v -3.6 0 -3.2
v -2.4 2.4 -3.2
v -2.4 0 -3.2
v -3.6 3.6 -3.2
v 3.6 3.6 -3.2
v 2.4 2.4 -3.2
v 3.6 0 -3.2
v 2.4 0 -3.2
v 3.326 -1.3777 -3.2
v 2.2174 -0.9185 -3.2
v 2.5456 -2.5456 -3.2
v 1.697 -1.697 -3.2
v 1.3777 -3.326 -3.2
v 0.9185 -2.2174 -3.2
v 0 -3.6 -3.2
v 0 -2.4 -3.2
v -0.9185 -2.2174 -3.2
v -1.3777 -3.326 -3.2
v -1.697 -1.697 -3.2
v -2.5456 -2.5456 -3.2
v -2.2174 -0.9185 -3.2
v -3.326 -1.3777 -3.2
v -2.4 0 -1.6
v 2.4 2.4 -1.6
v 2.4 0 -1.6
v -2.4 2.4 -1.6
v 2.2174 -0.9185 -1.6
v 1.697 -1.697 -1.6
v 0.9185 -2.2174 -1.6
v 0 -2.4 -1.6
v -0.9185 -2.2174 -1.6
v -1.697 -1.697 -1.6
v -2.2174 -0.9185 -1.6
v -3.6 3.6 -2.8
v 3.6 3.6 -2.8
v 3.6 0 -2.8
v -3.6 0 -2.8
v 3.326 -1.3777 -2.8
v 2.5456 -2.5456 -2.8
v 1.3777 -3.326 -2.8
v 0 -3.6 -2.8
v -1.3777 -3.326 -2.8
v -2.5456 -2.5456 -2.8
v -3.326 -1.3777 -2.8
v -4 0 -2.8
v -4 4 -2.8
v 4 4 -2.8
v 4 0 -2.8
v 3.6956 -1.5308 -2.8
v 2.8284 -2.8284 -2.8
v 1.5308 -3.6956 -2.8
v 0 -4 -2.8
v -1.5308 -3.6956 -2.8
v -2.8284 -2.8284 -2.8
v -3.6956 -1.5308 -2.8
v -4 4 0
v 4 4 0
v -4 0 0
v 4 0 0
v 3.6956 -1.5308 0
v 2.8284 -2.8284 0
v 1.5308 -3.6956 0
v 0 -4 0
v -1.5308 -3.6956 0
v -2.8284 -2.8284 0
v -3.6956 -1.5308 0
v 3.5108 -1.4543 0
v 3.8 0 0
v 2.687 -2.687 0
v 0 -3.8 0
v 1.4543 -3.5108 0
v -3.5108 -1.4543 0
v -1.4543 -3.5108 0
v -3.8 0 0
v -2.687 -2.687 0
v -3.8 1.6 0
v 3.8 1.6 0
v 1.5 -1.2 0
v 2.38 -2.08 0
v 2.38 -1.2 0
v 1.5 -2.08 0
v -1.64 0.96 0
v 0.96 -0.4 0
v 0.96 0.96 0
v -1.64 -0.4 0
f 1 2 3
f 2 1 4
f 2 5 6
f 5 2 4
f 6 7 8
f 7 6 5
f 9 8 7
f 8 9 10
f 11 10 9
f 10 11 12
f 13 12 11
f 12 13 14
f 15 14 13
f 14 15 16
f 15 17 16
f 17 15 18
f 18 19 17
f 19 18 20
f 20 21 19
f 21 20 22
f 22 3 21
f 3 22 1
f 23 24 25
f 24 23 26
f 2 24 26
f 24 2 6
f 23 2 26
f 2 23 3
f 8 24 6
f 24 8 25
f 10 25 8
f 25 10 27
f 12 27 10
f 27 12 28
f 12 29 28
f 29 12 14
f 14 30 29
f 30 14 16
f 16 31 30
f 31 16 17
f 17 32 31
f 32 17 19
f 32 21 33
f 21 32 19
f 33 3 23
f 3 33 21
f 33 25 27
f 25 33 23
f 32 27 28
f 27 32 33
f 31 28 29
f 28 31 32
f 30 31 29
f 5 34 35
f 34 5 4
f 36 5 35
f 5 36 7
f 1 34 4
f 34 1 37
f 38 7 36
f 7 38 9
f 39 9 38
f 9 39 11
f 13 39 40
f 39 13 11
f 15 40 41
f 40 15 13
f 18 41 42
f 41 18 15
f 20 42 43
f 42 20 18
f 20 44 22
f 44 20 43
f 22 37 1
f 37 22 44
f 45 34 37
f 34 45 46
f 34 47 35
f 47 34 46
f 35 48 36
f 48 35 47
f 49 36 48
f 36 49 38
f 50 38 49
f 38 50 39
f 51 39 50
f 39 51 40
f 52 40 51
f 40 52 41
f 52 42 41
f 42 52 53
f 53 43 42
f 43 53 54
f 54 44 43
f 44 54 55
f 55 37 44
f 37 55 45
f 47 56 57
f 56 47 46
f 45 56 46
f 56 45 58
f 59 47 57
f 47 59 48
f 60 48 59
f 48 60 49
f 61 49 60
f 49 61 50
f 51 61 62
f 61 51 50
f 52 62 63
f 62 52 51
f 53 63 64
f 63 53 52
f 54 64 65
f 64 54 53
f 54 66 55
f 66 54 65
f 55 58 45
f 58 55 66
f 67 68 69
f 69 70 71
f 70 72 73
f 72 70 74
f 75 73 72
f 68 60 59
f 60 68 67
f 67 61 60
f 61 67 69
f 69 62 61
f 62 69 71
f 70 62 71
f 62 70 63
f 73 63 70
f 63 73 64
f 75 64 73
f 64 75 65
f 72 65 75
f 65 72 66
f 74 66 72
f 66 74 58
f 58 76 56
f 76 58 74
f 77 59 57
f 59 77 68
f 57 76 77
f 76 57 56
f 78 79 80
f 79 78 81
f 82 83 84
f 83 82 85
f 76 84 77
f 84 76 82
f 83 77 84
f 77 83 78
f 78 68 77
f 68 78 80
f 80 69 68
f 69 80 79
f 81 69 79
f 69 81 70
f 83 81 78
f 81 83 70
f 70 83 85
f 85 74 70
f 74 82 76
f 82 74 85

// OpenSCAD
// file: ../p/2-4edge.scad
use <../lib.scad>
function ldraw_lib__2_4edge() = [
// 0 Circle 0.5
// 0 Name: 2-4edge.dat
// 0 Author: James Jessiman
// 0 !LDRAW_ORG Primitive UPDATE 2017-01
// 0 !LICENSE Licensed under CC BY 4.0 : see CAreadme.txt
// 
// 0 BFC CERTIFY CCW
  [0,"BFC","CERTIFY"],
  [0,"BFC","CCW"],
// 
// 0 !HISTORY 2007-06-24 [PTadmin] Header formatted for Contributor Agreement
// 0 !HISTORY 2008-07-01 [PTadmin] Official Update 2008-01
// 0 !HISTORY 2017-01-15 [Steffen] BFCed
// 0 !HISTORY 2017-12-30 [PTadmin] Official Update 2017-01
// 
// 
// 2 24 1 0 0 0.9239 0 0.3827
  [2,24,1,0,0,0.9239,0,0.3827],
// 2 24 0.9239 0 0.3827 0.7071 0 0.7071
  [2,24,0.9239,0,0.3827,0.7071,0,0.7071],
// 2 24 0.7071 0 0.7071 0.3827 0 0.9239
  [2,24,0.7071,0,0.7071,0.3827,0,0.9239],
// 2 24 0.3827 0 0.9239 0 0 1
  [2,24,0.3827,0,0.9239,0,0,1],
// 2 24 0 0 1 -0.3827 0 0.9239
  [2,24,0,0,1,-0.3827,0,0.9239],
// 2 24 -0.3827 0 0.9239 -0.7071 0 0.7071
  [2,24,-0.3827,0,0.9239,-0.7071,0,0.7071],
// 2 24 -0.7071 0 0.7071 -0.9239 0 0.3827
  [2,24,-0.7071,0,0.7071,-0.9239,0,0.3827],
// 2 24 -0.9239 0 0.3827 -1 0 0
  [2,24,-0.9239,0,0.3827,-1,0,0],
];
module ldraw_lib__2_4edge(step=0, col=false, unit=2/5, alt=false, line=0.2, solid=!$preview)
    makepoly(ldraw_lib__2_4edge(), step=step, col=col, unit=unit, alt=alt, line=line, solid=solid);
ldraw_lib__2_4edge(line=0.2);
// file: ../p/2-4cyli.scad
use <../lib.scad>
function ldraw_lib__2_4cyli() = [
// 0 Cylinder 0.5
// 0 Name: 2-4cyli.dat
// 0 Author: James Jessiman
// 0 !LDRAW_ORG Primitive UPDATE 2005-01
// 0 !LICENSE Licensed under CC BY 4.0 : see CAreadme.txt
// 
// 0 BFC CERTIFY CCW
  [0,"BFC","CERTIFY"],
  [0,"BFC","CCW"],
// 
// 0 !HISTORY 2002-03-23 [sbliss] Added BFC statement; compacted code
// 0 !HISTORY 2002-04-25 [PTadmin] Official Update 2002-02
// 0 !HISTORY 2004-12-11 [nielsk] Recreated using Primitive Generator, Edge lines fixed, BFC changed to CCW
// 0 !HISTORY 2005-12-28 [PTadmin] Official Update 2005-01
// 0 !HISTORY 2007-06-24 [PTadmin] Header formatted for Contributor Agreement
// 0 !HISTORY 2008-07-01 [PTadmin] Official Update 2008-01
// 
// 
// 4 16 .9239 1 .3827 .9239 0 .3827 1 0 0 1 1 0
  [4,16,.9239,1,.3827,.9239,0,.3827,1,0,0,1,1,0],
// 4 16 .7071 1 .7071 .7071 0 .7071 .9239 0 .3827 .9239 1 .3827
  [4,16,.7071,1,.7071,.7071,0,.7071,.9239,0,.3827,.9239,1,.3827],
// 4 16 .3827 1 .9239 .3827 0 .9239 .7071 0 .7071 .7071 1 .7071
  [4,16,.3827,1,.9239,.3827,0,.9239,.7071,0,.7071,.7071,1,.7071],
// 4 16 0 1 1 0 0 1 .3827 0 .9239 .3827 1 .9239
  [4,16,0,1,1,0,0,1,.3827,0,.9239,.3827,1,.9239],
// 4 16 -.3827 1 .9239 -.3827 0 .9239 0 0 1 0 1 1
  [4,16,-.3827,1,.9239,-.3827,0,.9239,0,0,1,0,1,1],
// 4 16 -.7071 1 .7071 -.7071 0 .7071 -.3827 0 .9239 -.3827 1 .9239
  [4,16,-.7071,1,.7071,-.7071,0,.7071,-.3827,0,.9239,-.3827,1,.9239],
// 4 16 -.9239 1 .3827 -.9239 0 .3827 -.7071 0 .7071 -.7071 1 .7071
  [4,16,-.9239,1,.3827,-.9239,0,.3827,-.7071,0,.7071,-.7071,1,.7071],
// 4 16 -1 1 0 -1 0 0 -.9239 0 .3827 -.9239 1 .3827
  [4,16,-1,1,0,-1,0,0,-.9239,0,.3827,-.9239,1,.3827],
// 5 24 1 1 0 1 0 0 1 1 -.4142 .9239 1 .3827
  [5,24,1,1,0,1,0,0,1,1,-.4142,.9239,1,.3827],
// 5 24 .9239 1 .3827 .9239 0 .3827 1 1 0 .7071 1 .7071
  [5,24,.9239,1,.3827,.9239,0,.3827,1,1,0,.7071,1,.7071],
// 5 24 .7071 1 .7071 .7071 0 .7071 .9239 1 .3827 .3827 1 .9239
  [5,24,.7071,1,.7071,.7071,0,.7071,.9239,1,.3827,.3827,1,.9239],
// 5 24 .3827 1 .9239 .3827 0 .9239 .7071 1 .7071 0 1 1
  [5,24,.3827,1,.9239,.3827,0,.9239,.7071,1,.7071,0,1,1],
// 5 24 0 1 1 0 0 1 .3827 1 .9239 -.3827 1 .9239
  [5,24,0,1,1,0,0,1,.3827,1,.9239,-.3827,1,.9239],
// 5 24 -.3827 1 .9239 -.3827 0 .9239 0 1 1 -.7071 1 .7071
  [5,24,-.3827,1,.9239,-.3827,0,.9239,0,1,1,-.7071,1,.7071],
// 5 24 -.7071 1 .7071 -.7071 0 .7071 -.3827 1 .9239 -.9239 1 .3827
  [5,24,-.7071,1,.7071,-.7071,0,.7071,-.3827,1,.9239,-.9239,1,.3827],
// 5 24 -.9239 1 .3827 -.9239 0 .3827 -.7071 1 .7071 -1 1 0
  [5,24,-.9239,1,.3827,-.9239,0,.3827,-.7071,1,.7071,-1,1,0],
// 5 24 -1 1 0 -1 0 0 -.9239 1 .3827 -1 1 -.4142
  [5,24,-1,1,0,-1,0,0,-.9239,1,.3827,-1,1,-.4142],
// 0
];
module ldraw_lib__2_4cyli(step=0, col=false, unit=2/5, alt=false, line=0.2, solid=!$preview)
    makepoly(ldraw_lib__2_4cyli(), step=step, col=col, unit=unit, alt=alt, line=line, solid=solid);
ldraw_lib__2_4cyli(line=0.2);
// file: ../p/box4-4a.scad
use <../lib.scad>
function ldraw_lib__box4_4a() = [
// 0 Box with  4 Faces without  4 Adjacent Edges
// 0 Name: box4-4a.dat
// 0 Author: Willy Tschager [Holly-Wood]
// 0 !LDRAW_ORG Primitive UPDATE 2024-01
// 0 !LICENSE Licensed under CC BY 4.0 : see CAreadme.txt
// 
// 0 BFC CERTIFY CCW
  [0,"BFC","CERTIFY"],
  [0,"BFC","CCW"],
// 
// 0 !HISTORY 1998-07-15 [PTadmin] Official Update 1998-07
// 0 !HISTORY 2002-12-13 [hafhead] Made BFC compliant
// 0 !HISTORY 2003-03-12 [PTadmin] Official Update 2003-01
// 0 !HISTORY 2007-06-24 [PTadmin] Header formatted for Contributor Agreement
// 0 !HISTORY 2008-07-01 [PTadmin] Official Update 2008-01
// 0 !HISTORY 2012-02-16 [Philo] Changed to CCW
// 0 !HISTORY 2012-03-30 [PTadmin] Official Update 2012-01
// 0 !HISTORY 2024-01-03 [Holly-Wood] Complete re-write, original by Manfred Moolhuysen
// 0 !HISTORY 2024-01-29 [OrionP] Official Update 2024-01
// 
// 2 24 -1 1 -1 -1 1 1
  [2,24,-1,1,-1,-1,1,1],
// 2 24 1 1 1 1 1 -1
  [2,24,1,1,1,1,1,-1],
// 2 24 -1 1 1 1 1 1
  [2,24,-1,1,1,1,1,1],
// 4 16 1 1 1 1 1 -1 -1 1 -1 -1 1 1
  [4,16,1,1,1,1,1,-1,-1,1,-1,-1,1,1],
// 
// 2 24 -1 0 -1 -1 0 1
  [2,24,-1,0,-1,-1,0,1],
// 4 16 -1 1 1 -1 1 -1 -1 0 -1 -1 0 1
  [4,16,-1,1,1,-1,1,-1,-1,0,-1,-1,0,1],
// 
// 2 24 1 0 1 1 0 -1
  [2,24,1,0,1,1,0,-1],
// 4 16 1 1 -1 1 1 1 1 0 1 1 0 -1
  [4,16,1,1,-1,1,1,1,1,0,1,1,0,-1],
// 
// 2 24 1 1 1 1 0 1
  [2,24,1,1,1,1,0,1],
// 2 24 -1 1 1 -1 0 1
  [2,24,-1,1,1,-1,0,1],
// 2 24 -1 0 1 1 0 1
  [2,24,-1,0,1,1,0,1],
// 4 16 1 1 1 -1 1 1 -1 0 1 1 0 1
  [4,16,1,1,1,-1,1,1,-1,0,1,1,0,1],
];
module ldraw_lib__box4_4a(step=0, col=false, unit=2/5, alt=false, line=0.2, solid=!$preview)
    makepoly(ldraw_lib__box4_4a(), step=step, col=col, unit=unit, alt=alt, line=line, solid=solid);
ldraw_lib__box4_4a(line=0.2);
// file: ../p/box3u4a.scad
use <../lib.scad>
function ldraw_lib__box3u4a() = [
// 0 Box with 3 Faces without 4 Adjacent Edges
// 0 Name: box3u4a.dat
// 0 Author: Niels Karsdorp [nielsk]
// 0 !LDRAW_ORG Primitive UPDATE 2009-01
// 0 !LICENSE Licensed under CC BY 4.0 : see CAreadme.txt
// 
// 0 BFC CERTIFY CCW
  [0,"BFC","CERTIFY"],
  [0,"BFC","CCW"],
// 
// 0 !HISTORY 2009-05-02 [PTadmin] Official Update 2009-01
// 
// 
// 2 24 1 1 1 -1 1 1
  [2,24,1,1,1,-1,1,1],
// 2 24 -1 1 -1 1 1 -1
  [2,24,-1,1,-1,1,1,-1],
// 2 24 1 1 1 1 1 -1
  [2,24,1,1,1,1,1,-1],
// 2 24 -1 1 1 -1 1 -1
  [2,24,-1,1,1,-1,1,-1],
// 2 24 1 1 1 1 0 1
  [2,24,1,1,1,1,0,1],
// 2 24 1 1 -1 1 0 -1
  [2,24,1,1,-1,1,0,-1],
// 2 24 -1 1 1 -1 0 1
  [2,24,-1,1,1,-1,0,1],
// 2 24 -1 1 -1 -1 0 -1
  [2,24,-1,1,-1,-1,0,-1],
// 4 16 -1 1 -1 -1 1 1 1 1 1 1 1 -1
  [4,16,-1,1,-1,-1,1,1,1,1,1,1,1,-1],
// 4 16 -1 1 1 -1 0 1 1 0 1 1 1 1
  [4,16,-1,1,1,-1,0,1,1,0,1,1,1,1],
// 4 16 1 1 -1 1 0 -1 -1 0 -1 -1 1 -1
  [4,16,1,1,-1,1,0,-1,-1,0,-1,-1,1,-1],
// 0
];
module ldraw_lib__box3u4a(step=0, col=false, unit=2/5, alt=false, line=0.2, solid=!$preview)
    makepoly(ldraw_lib__box3u4a(), step=step, col=col, unit=unit, alt=alt, line=line, solid=solid);
ldraw_lib__box3u4a(line=0.2);
// file: ../p/2-4ring9.scad
use <../lib.scad>
function ldraw_lib__2_4ring9() = [
// 0 Ring  9 x 0.5
// 0 Name: 2-4ring9.dat
// 0 Author: Willy Tschager [Holly-Wood]
// 0 !LDRAW_ORG Primitive UPDATE 2024-01
// 0 !LICENSE Licensed under CC BY 4.0 : see CAreadme.txt
// 
// 0 BFC CERTIFY CCW
  [0,"BFC","CERTIFY"],
  [0,"BFC","CCW"],
// 
// 0 !HISTORY 2009-09-03 [PTadmin] Official Update 2009-02
// 0 !HISTORY 2024-01-10 [Holly-Wood] Complete regeneration, original by guyvivan
// 0 !HISTORY 2024-01-29 [OrionP] Official Update 2024-01
// 
// 4 16 10 0 0 9.239 0 3.827 8.3151 0 3.4443 9 0 0
  [4,16,10,0,0,9.239,0,3.827,8.3151,0,3.4443,9,0,0],
// 4 16 9.239 0 3.827 7.071 0 7.071 6.3639 0 6.3639 8.3151 0 3.4443
  [4,16,9.239,0,3.827,7.071,0,7.071,6.3639,0,6.3639,8.3151,0,3.4443],
// 4 16 7.071 0 7.071 3.827 0 9.239 3.4443 0 8.3151 6.3639 0 6.3639
  [4,16,7.071,0,7.071,3.827,0,9.239,3.4443,0,8.3151,6.3639,0,6.3639],
// 4 16 3.827 0 9.239 0 0 10 0 0 9 3.4443 0 8.3151
  [4,16,3.827,0,9.239,0,0,10,0,0,9,3.4443,0,8.3151],
// 4 16 0 0 10 -3.827 0 9.239 -3.4443 0 8.3151 0 0 9
  [4,16,0,0,10,-3.827,0,9.239,-3.4443,0,8.3151,0,0,9],
// 4 16 -3.827 0 9.239 -7.071 0 7.071 -6.3639 0 6.3639 -3.4443 0 8.3151
  [4,16,-3.827,0,9.239,-7.071,0,7.071,-6.3639,0,6.3639,-3.4443,0,8.3151],
// 4 16 -7.071 0 7.071 -9.239 0 3.827 -8.3151 0 3.4443 -6.3639 0 6.3639
  [4,16,-7.071,0,7.071,-9.239,0,3.827,-8.3151,0,3.4443,-6.3639,0,6.3639],
// 4 16 -9.239 0 3.827 -10 0 0 -9 0 0 -8.3151 0 3.4443
  [4,16,-9.239,0,3.827,-10,0,0,-9,0,0,-8.3151,0,3.4443],
// 0 // Build by LDPartEditor (PrimGen 2.X)
];
module ldraw_lib__2_4ring9(step=0, col=false, unit=2/5, alt=false, line=0.2, solid=!$preview)
    makepoly(ldraw_lib__2_4ring9(), step=step, col=col, unit=unit, alt=alt, line=line, solid=solid);
ldraw_lib__2_4ring9(line=0.2);
// file: ../p/2-4ring2.scad
use <../lib.scad>
function ldraw_lib__2_4ring2() = [
// 0 Ring  2 x 0.5
// 0 Name: 2-4ring2.dat
// 0 Author: Chris Dee [cwdee]
// 0 !LDRAW_ORG Primitive UPDATE 2012-01
// 0 !LICENSE Licensed under CC BY 4.0 : see CAreadme.txt
// 
// 0 BFC CERTIFY CCW
  [0,"BFC","CERTIFY"],
  [0,"BFC","CCW"],
// 
// 0 !HISTORY 2001-10-26 [PTadmin] Official Update 2001-01
// 0 !HISTORY 2007-06-24 [PTadmin] Header formatted for Contributor Agreement
// 0 !HISTORY 2008-07-01 [PTadmin] Official Update 2008-01
// 0 !HISTORY 2012-02-16 [Philo] Changed to CCW
// 0 !HISTORY 2012-03-30 [PTadmin] Official Update 2012-01
// 
// 
// 4 16 3 0 0 2.7717 0 1.1481 1.8478 0 0.7654 2 0 0
  [4,16,3,0,0,2.7717,0,1.1481,1.8478,0,0.7654,2,0,0],
// 4 16 2.7717 0 1.1481 2.1213 0 2.1213 1.4142 0 1.4142 1.8478 0 0.7654
  [4,16,2.7717,0,1.1481,2.1213,0,2.1213,1.4142,0,1.4142,1.8478,0,0.7654],
// 4 16 2.1213 0 2.1213 1.1481 0 2.7717 0.7654 0 1.8478 1.4142 0 1.4142
  [4,16,2.1213,0,2.1213,1.1481,0,2.7717,0.7654,0,1.8478,1.4142,0,1.4142],
// 4 16 1.1481 0 2.7717 0 0 3 0 0 2 0.7654 0 1.8478
  [4,16,1.1481,0,2.7717,0,0,3,0,0,2,0.7654,0,1.8478],
// 4 16 0 0 3 -1.1481 0 2.7717 -0.7654 0 1.8478 0 0 2
  [4,16,0,0,3,-1.1481,0,2.7717,-0.7654,0,1.8478,0,0,2],
// 4 16 -1.1481 0 2.7717 -2.1213 0 2.1213 -1.4142 0 1.4142 -0.7654 0 1.8478
  [4,16,-1.1481,0,2.7717,-2.1213,0,2.1213,-1.4142,0,1.4142,-0.7654,0,1.8478],
// 4 16 -2.1213 0 2.1213 -2.7717 0 1.1481 -1.8478 0 0.7654 -1.4142 0 1.4142
  [4,16,-2.1213,0,2.1213,-2.7717,0,1.1481,-1.8478,0,0.7654,-1.4142,0,1.4142],
// 4 16 -2.7717 0 1.1481 -3 0 0 -2 0 0 -1.8478 0 0.7654
  [4,16,-2.7717,0,1.1481,-3,0,0,-2,0,0,-1.8478,0,0.7654],
];
module ldraw_lib__2_4ring2(step=0, col=false, unit=2/5, alt=false, line=0.2, solid=!$preview)
    makepoly(ldraw_lib__2_4ring2(), step=step, col=col, unit=unit, alt=alt, line=line, solid=solid);
ldraw_lib__2_4ring2(line=0.2);
// file: ../p/2-4cylo.scad
use <../lib.scad>
use <2-4cyli.scad>
use <2-4edge.scad>
function ldraw_lib__2_4cylo() = [
// 0 Cylinder Open 0.5
// 0 Name: 2-4cylo.dat
// 0 Author: Max Martin Richter [MMR1988]
// 0 !LDRAW_ORG Primitive UPDATE 2010-03
// 0 !LICENSE Licensed under CC BY 4.0 : see CAreadme.txt
// 
// 0 BFC CERTIFY CCW
  [0,"BFC","CERTIFY"],
  [0,"BFC","CCW"],
// 
// 0 !HISTORY 2010-12-31 [PTadmin] Official Update 2010-03
// 
// 
// 1 16 0 0 0 1 0 0 0 1 0 0 0 1 2-4edge.dat
  [1,16,0,0,0,1,0,0,0,1,0,0,0,1, ldraw_lib__2_4edge()],
// 1 16 0 1 0 1 0 0 0 1 0 0 0 1 2-4edge.dat
  [1,16,0,1,0,1,0,0,0,1,0,0,0,1, ldraw_lib__2_4edge()],
// 1 16 0 0 0 1 0 0 0 1 0 0 0 1 2-4cyli.dat
  [1,16,0,0,0,1,0,0,0,1,0,0,0,1, ldraw_lib__2_4cyli()],
];
module ldraw_lib__2_4cylo(step=0, col=false, unit=2/5, alt=false, line=0.2, solid=!$preview)
    makepoly(ldraw_lib__2_4cylo(), step=step, col=col, unit=unit, alt=alt, line=line, solid=solid);
ldraw_lib__2_4cylo(line=0.2);
// file: ../p/2-4chrd.scad
use <../lib.scad>
function ldraw_lib__2_4chrd() = [
// 0 Chord 0.5
// 0 Name: 2-4chrd.dat
// 0 Author: Philippe Hurbain [Philo]
// 0 !LDRAW_ORG Primitive UPDATE 2014-01
// 0 !LICENSE Licensed under CC BY 4.0 : see CAreadme.txt
// 
// 0 BFC CERTIFY CCW
  [0,"BFC","CERTIFY"],
  [0,"BFC","CCW"],
// 
// 0 !HISTORY 2014-06-21 [PTadmin] Official Update 2014-01
// 
// 
// 4 16 0.9239 0 0.3827 -0.9239 0 0.3827 -1 0 0 1 0 0
  [4,16,0.9239,0,0.3827,-0.9239,0,0.3827,-1,0,0,1,0,0],
// 4 16 0.7071 0 0.7071 -0.7071 0 0.7071 -0.9239 0 0.3827 0.9239 0 0.3827
  [4,16,0.7071,0,0.7071,-0.7071,0,0.7071,-0.9239,0,0.3827,0.9239,0,0.3827],
// 4 16 0.3827 0 0.9239 -0.3827 0 0.9239 -0.7071 0 0.7071 0.7071 0 0.7071
  [4,16,0.3827,0,0.9239,-0.3827,0,0.9239,-0.7071,0,0.7071,0.7071,0,0.7071],
// 3 16 0 0 1 -0.3827 0 0.9239 0.3827 0 0.9239
  [3,16,0,0,1,-0.3827,0,0.9239,0.3827,0,0.9239],
];
module ldraw_lib__2_4chrd(step=0, col=false, unit=2/5, alt=false, line=0.2, solid=!$preview)
    makepoly(ldraw_lib__2_4chrd(), step=step, col=col, unit=unit, alt=alt, line=line, solid=solid);
ldraw_lib__2_4chrd(line=0.2);
// file: s/24246s02.scad
use <../../lib.scad>
use <../../p/2-4chrd.scad>
use <../../p/2-4cylo.scad>
use <../../p/2-4ring2.scad>
use <../../p/2-4ring9.scad>
use <../../p/box3u4a.scad>
use <../../p/box4-4a.scad>
function ldraw_lib__s__24246s02() = [
// 0 ~Tile  1 x  1 with Rounded End without Complete Top Face
// 0 Name: s\24246s02.dat
// 0 Author: Magnus Forsberg [MagFors]
// 0 !LDRAW_ORG Subpart UPDATE 2020-02
// 0 !LICENSE Licensed under CC BY 4.0 : see CAreadme.txt
// 
// 0 BFC CERTIFY CCW
  [0,"BFC","CERTIFY"],
  [0,"BFC","CCW"],
// 
// 0 !HISTORY 2020-09-05 [PTadmin] Official Update 2020-02
// 
// 
// 4 16 -9 8 0 -9 8 9 -6 8 6 -6 8 0
  [4,16,-9,8,0,-9,8,9,-6,8,6,-6,8,0],
// 4 16 -9 8 9 9 8 9 6 8 6 -6 8 6
  [4,16,-9,8,9,9,8,9,6,8,6,-6,8,6],
// 4 16 9 8 9 9 8 0 6 8 0 6 8 6
  [4,16,9,8,9,9,8,0,6,8,0,6,8,6],
// 1 16 0 8 0 3 0 0 0 -1 0 0 0 -3 2-4ring2.dat
  [1,16,0,8,0,3,0,0,0,-1,0,0,0,-3, ldraw_lib__2_4ring2()],
// 0 BFC INVERTNEXT
  [0,"BFC","INVERTNEXT"],
// 1 16 0 8 3 6 0 0 0 -4 0 0 0 3 box4-4a.dat
  [1,16,0,8,3,6,0,0,0,-4,0,0,0,3, ldraw_lib__box4_4a()],
// 0 BFC INVERTNEXT
  [0,"BFC","INVERTNEXT"],
// 1 16 0 4 0 6 0 0 0 4 0 0 0 -6 2-4cylo.dat
  [1,16,0,4,0,6,0,0,0,4,0,0,0,-6, ldraw_lib__2_4cylo()],
// 1 16 0 4 0 6 0 0 0 -4 0 0 0 -6 2-4chrd.dat
  [1,16,0,4,0,6,0,0,0,-4,0,0,0,-6, ldraw_lib__2_4chrd()],
// 1 16 0 7.5 0 0 0 9 0.5 0 0 0 9 0 box3u4a.dat
  [1,16,0,7.5,0,0,0,9,0.5,0,0,0,9,0, ldraw_lib__box3u4a()],
// 1 16 0 7 0 9 0 0 0 1 0 0 0 -9 2-4cylo.dat
  [1,16,0,7,0,9,0,0,0,1,0,0,0,-9, ldraw_lib__2_4cylo()],
// 4 16 -10 7 0 -10 7 10 -9 7 9 -9 7 0
  [4,16,-10,7,0,-10,7,10,-9,7,9,-9,7,0],
// 4 16 -10 7 10 10 7 10 9 7 9 -9 7 9
  [4,16,-10,7,10,10,7,10,9,7,9,-9,7,9],
// 4 16 10 7 10 10 7 0 9 7 0 9 7 9
  [4,16,10,7,10,10,7,0,9,7,0,9,7,9],
// 1 16 0 7 0 1 0 0 0 -1 0 0 0 -1 2-4ring9.dat
  [1,16,0,7,0,1,0,0,0,-1,0,0,0,-1, ldraw_lib__2_4ring9()],
// 1 16 0 3.5 0 0 0 -10 -3.5 0 0 0 10 0 box3u4a.dat
  [1,16,0,3.5,0,0,0,-10,-3.5,0,0,0,10,0, ldraw_lib__box3u4a()],
// 1 16 0 0 0 10 0 0 0 7 0 0 0 -10 2-4cylo.dat
  [1,16,0,0,0,10,0,0,0,7,0,0,0,-10, ldraw_lib__2_4cylo()],
];
module ldraw_lib__s__24246s02(step=0, col=false, unit=2/5, alt=false, line=0.2, solid=!$preview)
    makepoly(ldraw_lib__s__24246s02(), step=step, col=col, unit=unit, alt=alt, line=line, solid=solid);
ldraw_lib__s__24246s02(line=0.2);
// file: ../p/2-4ring19.scad
use <../lib.scad>
function ldraw_lib__2_4ring19() = [
// 0 Ring 19 x 0.5
// 0 Name: 2-4ring19.dat
// 0 Author: Willy Tschager [Holly-Wood]
// 0 !LDRAW_ORG Primitive UPDATE 2024-02
// 0 !LICENSE Licensed under CC BY 4.0 : see CAreadme.txt
// 
// 0 BFC CERTIFY CCW
  [0,"BFC","CERTIFY"],
  [0,"BFC","CCW"],
// 
// 0 !HISTORY 2016-12-31 [PTadmin] Official Update 2016-01
// 0 !HISTORY 2024-02-06 [Holly-Wood] Complete regeneration, original by KROACH
// 0 !HISTORY 2024-03-24 [OrionP] Official Update 2024-02
// 
// 4 16 20 0 0 18.478 0 7.654 17.5541 0 7.2713 19 0 0
  [4,16,20,0,0,18.478,0,7.654,17.5541,0,7.2713,19,0,0],
// 4 16 18.478 0 7.654 14.142 0 14.142 13.4349 0 13.4349 17.5541 0 7.2713
  [4,16,18.478,0,7.654,14.142,0,14.142,13.4349,0,13.4349,17.5541,0,7.2713],
// 4 16 14.142 0 14.142 7.654 0 18.478 7.2713 0 17.5541 13.4349 0 13.4349
  [4,16,14.142,0,14.142,7.654,0,18.478,7.2713,0,17.5541,13.4349,0,13.4349],
// 4 16 7.654 0 18.478 0 0 20 0 0 19 7.2713 0 17.5541
  [4,16,7.654,0,18.478,0,0,20,0,0,19,7.2713,0,17.5541],
// 4 16 0 0 20 -7.654 0 18.478 -7.2713 0 17.5541 0 0 19
  [4,16,0,0,20,-7.654,0,18.478,-7.2713,0,17.5541,0,0,19],
// 4 16 -7.654 0 18.478 -14.142 0 14.142 -13.4349 0 13.4349 -7.2713 0 17.5541
  [4,16,-7.654,0,18.478,-14.142,0,14.142,-13.4349,0,13.4349,-7.2713,0,17.5541],
// 4 16 -14.142 0 14.142 -18.478 0 7.654 -17.5541 0 7.2713 -13.4349 0 13.4349
  [4,16,-14.142,0,14.142,-18.478,0,7.654,-17.5541,0,7.2713,-13.4349,0,13.4349],
// 4 16 -18.478 0 7.654 -20 0 0 -19 0 0 -17.5541 0 7.2713
  [4,16,-18.478,0,7.654,-20,0,0,-19,0,0,-17.5541,0,7.2713],
// 0 // Build by LDPartEditor (PrimGen 2.X)
];
module ldraw_lib__2_4ring19(step=0, col=false, unit=2/5, alt=false, line=0.2, solid=!$preview)
    makepoly(ldraw_lib__2_4ring19(), step=step, col=col, unit=unit, alt=alt, line=line, solid=solid);
ldraw_lib__2_4ring19(line=0.2);
// file: ../p/1-8chrd.scad
use <../lib.scad>
function ldraw_lib__1_8chrd() = [
// 0 Chord 0.125
// 0 Name: 1-8chrd.dat
// 0 Author: Orion Pobursky [OrionP]
// 0 !LDRAW_ORG Primitive UPDATE 2023-05
// 0 !LICENSE Licensed under CC BY 4.0 : see CAreadme.txt
// 
// 0 BFC CERTIFY CCW
  [0,"BFC","CERTIFY"],
  [0,"BFC","CCW"],
// 
// 0 !HISTORY 2004-04-22 [PTadmin] Official Update 2004-02
// 0 !HISTORY 2007-06-22 [PTadmin] Header formatted for Contributor Agreement
// 0 !HISTORY 2008-07-01 [PTadmin] Official Update 2008-01
// 0 !HISTORY 2023-10-27 [OrionP] Rebuilt with PrimGen2, original author westrate
// 0 !HISTORY 2023-10-31 [OrionP] Official Update 2023-05
// 
// 3 16 1 0 0 0.9239 0 0.3827 0.7071 0 0.7071
  [3,16,1,0,0,0.9239,0,0.3827,0.7071,0,0.7071],
];
module ldraw_lib__1_8chrd(step=0, col=false, unit=2/5, alt=false, line=0.2, solid=!$preview)
    makepoly(ldraw_lib__1_8chrd(), step=step, col=col, unit=unit, alt=alt, line=line, solid=solid);
ldraw_lib__1_8chrd(line=0.2);
// file: ../p/1-4chrd.scad
use <../lib.scad>
function ldraw_lib__1_4chrd() = [
// 0 Chord 0.25
// 0 Name: 1-4chrd.dat
// 0 Author: Max Martin Richter [MMR1988]
// 0 !LDRAW_ORG Primitive UPDATE 2023-05
// 0 !LICENSE Licensed under CC BY 4.0 : see CAreadme.txt
// 
// 0 BFC CERTIFY CCW
  [0,"BFC","CERTIFY"],
  [0,"BFC","CCW"],
// 
// 0 !HISTORY 2004-04-22 [PTadmin] Official Update 2004-02
// 0 !HISTORY 2007-10-09 [PTadmin] Header formatted for Contributor Agreement
// 0 !HISTORY 2008-07-01 [PTadmin] Official Update 2008-01
// 0 !HISTORY 2012-08-02 [MMR1988] Re-creation with PrimGen2 and Rectifier
// 0 !HISTORY 2012-08-09 [PTadmin] Official Update 2012-02
// 0 !HISTORY 2023-10-27 [OrionP] Change author to MMR1988 from hafhead
// 0 !HISTORY 2023-10-31 [OrionP] Official Update 2023-05
// 
// 4 16 0.9239 0 0.3827 0.3827 0 0.9239 0 0 1 1 0 0
  [4,16,0.9239,0,0.3827,0.3827,0,0.9239,0,0,1,1,0,0],
// 3 16 0.7071 0 0.7071 0.3827 0 0.9239 0.9239 0 0.3827
  [3,16,0.7071,0,0.7071,0.3827,0,0.9239,0.9239,0,0.3827],
];
module ldraw_lib__1_4chrd(step=0, col=false, unit=2/5, alt=false, line=0.2, solid=!$preview)
    makepoly(ldraw_lib__1_4chrd(), step=step, col=col, unit=unit, alt=alt, line=line, solid=solid);
ldraw_lib__1_4chrd(line=0.2);
// main file
use <../lib.scad>
use <../p/1-4chrd.scad>
use <../p/1-8chrd.scad>
use <../p/2-4ring19.scad>
use <s/24246s02.scad>
function ldraw_lib__24246pz0() = [
// 0 Tile  1 x  1 with Rounded End with White Rectangle and Square on Black Background Pattern
// 0 Name: 24246pz0.dat
// 0 Author: Vincent Messenet [Cheenzo]
// 0 !LDRAW_ORG Part UPDATE 2024-06
// 0 !LICENSE Licensed under CC BY 4.0 : see CAreadme.txt
// 
// 0 BFC CERTIFY CCW
  [0,"BFC","CERTIFY"],
  [0,"BFC","CCW"],
// 
// 0 !KEYWORDS Brickheadz, Bricklink 24246pb007, Brickowl 439833, Eye, Frankenstein
// 0 !KEYWORDS Rebrickable 24246pr0012, Set 40422
// 
// 0 !HISTORY 2024-07-29 [OrionP] Official Update 2024-06
// 
// 
// 1 16 0 0 0 1 0 0 0 1 0 0 0 1 s\24246s02.dat
  [1,16,0,0,0,1,0,0,0,1,0,0,0,1, ldraw_lib__s__24246s02()],
// 1 0 0 0 0 9.5 0 0 0 1 0 0 0 -9.5 1-8chrd.dat
  [1,0,0,0,0,9.5,0,0,0,1,0,0,0,-9.5, ldraw_lib__1_8chrd()],
// 1 0 0 0 0 0 0 9.5 0 1 0 -9.5 0 0 1-8chrd.dat
  [1,0,0,0,0,0,0,9.5,0,1,0,-9.5,0,0, ldraw_lib__1_8chrd()],
// 1 0 0 0 0 -9.5 0 0 0 1 0 0 0 -9.5 1-4chrd.dat
  [1,0,0,0,0,-9.5,0,0,0,1,0,0,0,-9.5, ldraw_lib__1_4chrd()],
// 1 16 0 0 0 .5 0 0 0 1 0 0 0 -.5 2-4ring19.dat
  [1,16,0,0,0,.5,0,0,0,1,0,0,0,-.5, ldraw_lib__2_4ring19()],
// 4 16 -9.5 0 4 -10 0 10 -10 0 0 -9.5 0 0
  [4,16,-9.5,0,4,-10,0,10,-10,0,0,-9.5,0,0],
// 4 16 9.5 0 4 9.5 0 0 10 0 0 10 0 10
  [4,16,9.5,0,4,9.5,0,0,10,0,0,10,0,10],
// 4 16 -9.5 0 4 9.5 0 4 10 0 10 -10 0 10
  [4,16,-9.5,0,4,9.5,0,4,10,0,10,-10,0,10],
// 4 15 3.75 0 -3 3.75 0 -5.2 5.95 0 -5.2 5.95 0 -3
  [4,15,3.75,0,-3,3.75,0,-5.2,5.95,0,-5.2,5.95,0,-3],
// 4 15 2.4 0 -1 2.4 0 2.4 -4.1 0 2.4 -4.1 0 -1
  [4,15,2.4,0,-1,2.4,0,2.4,-4.1,0,2.4,-4.1,0,-1],
// 4 0 -9.5 0 4 -4.1 0 2.4 2.4 0 2.4 9.5 0 4
  [4,0,-9.5,0,4,-4.1,0,2.4,2.4,0,2.4,9.5,0,4],
// 4 0 9.5 0 4 2.4 0 2.4 2.4 0 -1 3.75 0 -3
  [4,0,9.5,0,4,2.4,0,2.4,2.4,0,-1,3.75,0,-3],
// 4 0 9.5 0 4 3.75 0 -3 5.95 0 -3 9.5 0 0
  [4,0,9.5,0,4,3.75,0,-3,5.95,0,-3,9.5,0,0],
// 4 0 9.5 0 0 5.95 0 -3 5.95 0 -5.2 6.71745 0 -6.71745
  [4,0,9.5,0,0,5.95,0,-3,5.95,0,-5.2,6.71745,0,-6.71745],
// 4 0 6.71745 0 -6.71745 5.95 0 -5.2 3.75 0 -5.2 0 0 -9.5
  [4,0,6.71745,0,-6.71745,5.95,0,-5.2,3.75,0,-5.2,0,0,-9.5],
// 4 0 0 0 -9.5 3.75 0 -5.2 3.75 0 -3 2.4 0 -1
  [4,0,0,0,-9.5,3.75,0,-5.2,3.75,0,-3,2.4,0,-1],
// 3 0 0 0 -9.5 2.4 0 -1 -4.1 0 -1
  [3,0,0,0,-9.5,2.4,0,-1,-4.1,0,-1],
// 3 0 -4.1 0 -1 -9.5 0 0 0 0 -9.5
  [3,0,-4.1,0,-1,-9.5,0,0,0,0,-9.5],
// 4 0 -4.1 0 2.4 -9.5 0 4 -9.5 0 0 -4.1 0 -1
  [4,0,-4.1,0,2.4,-9.5,0,4,-9.5,0,0,-4.1,0,-1],
];
module ldraw_lib__24246pz0(step=0, col=false, unit=2/5, alt=false, line=0.2, solid=!$preview)
    makepoly(ldraw_lib__24246pz0(), step=step, col=col, unit=unit, alt=alt, line=line, solid=solid);
ldraw_lib__24246pz0(line=0.2);
